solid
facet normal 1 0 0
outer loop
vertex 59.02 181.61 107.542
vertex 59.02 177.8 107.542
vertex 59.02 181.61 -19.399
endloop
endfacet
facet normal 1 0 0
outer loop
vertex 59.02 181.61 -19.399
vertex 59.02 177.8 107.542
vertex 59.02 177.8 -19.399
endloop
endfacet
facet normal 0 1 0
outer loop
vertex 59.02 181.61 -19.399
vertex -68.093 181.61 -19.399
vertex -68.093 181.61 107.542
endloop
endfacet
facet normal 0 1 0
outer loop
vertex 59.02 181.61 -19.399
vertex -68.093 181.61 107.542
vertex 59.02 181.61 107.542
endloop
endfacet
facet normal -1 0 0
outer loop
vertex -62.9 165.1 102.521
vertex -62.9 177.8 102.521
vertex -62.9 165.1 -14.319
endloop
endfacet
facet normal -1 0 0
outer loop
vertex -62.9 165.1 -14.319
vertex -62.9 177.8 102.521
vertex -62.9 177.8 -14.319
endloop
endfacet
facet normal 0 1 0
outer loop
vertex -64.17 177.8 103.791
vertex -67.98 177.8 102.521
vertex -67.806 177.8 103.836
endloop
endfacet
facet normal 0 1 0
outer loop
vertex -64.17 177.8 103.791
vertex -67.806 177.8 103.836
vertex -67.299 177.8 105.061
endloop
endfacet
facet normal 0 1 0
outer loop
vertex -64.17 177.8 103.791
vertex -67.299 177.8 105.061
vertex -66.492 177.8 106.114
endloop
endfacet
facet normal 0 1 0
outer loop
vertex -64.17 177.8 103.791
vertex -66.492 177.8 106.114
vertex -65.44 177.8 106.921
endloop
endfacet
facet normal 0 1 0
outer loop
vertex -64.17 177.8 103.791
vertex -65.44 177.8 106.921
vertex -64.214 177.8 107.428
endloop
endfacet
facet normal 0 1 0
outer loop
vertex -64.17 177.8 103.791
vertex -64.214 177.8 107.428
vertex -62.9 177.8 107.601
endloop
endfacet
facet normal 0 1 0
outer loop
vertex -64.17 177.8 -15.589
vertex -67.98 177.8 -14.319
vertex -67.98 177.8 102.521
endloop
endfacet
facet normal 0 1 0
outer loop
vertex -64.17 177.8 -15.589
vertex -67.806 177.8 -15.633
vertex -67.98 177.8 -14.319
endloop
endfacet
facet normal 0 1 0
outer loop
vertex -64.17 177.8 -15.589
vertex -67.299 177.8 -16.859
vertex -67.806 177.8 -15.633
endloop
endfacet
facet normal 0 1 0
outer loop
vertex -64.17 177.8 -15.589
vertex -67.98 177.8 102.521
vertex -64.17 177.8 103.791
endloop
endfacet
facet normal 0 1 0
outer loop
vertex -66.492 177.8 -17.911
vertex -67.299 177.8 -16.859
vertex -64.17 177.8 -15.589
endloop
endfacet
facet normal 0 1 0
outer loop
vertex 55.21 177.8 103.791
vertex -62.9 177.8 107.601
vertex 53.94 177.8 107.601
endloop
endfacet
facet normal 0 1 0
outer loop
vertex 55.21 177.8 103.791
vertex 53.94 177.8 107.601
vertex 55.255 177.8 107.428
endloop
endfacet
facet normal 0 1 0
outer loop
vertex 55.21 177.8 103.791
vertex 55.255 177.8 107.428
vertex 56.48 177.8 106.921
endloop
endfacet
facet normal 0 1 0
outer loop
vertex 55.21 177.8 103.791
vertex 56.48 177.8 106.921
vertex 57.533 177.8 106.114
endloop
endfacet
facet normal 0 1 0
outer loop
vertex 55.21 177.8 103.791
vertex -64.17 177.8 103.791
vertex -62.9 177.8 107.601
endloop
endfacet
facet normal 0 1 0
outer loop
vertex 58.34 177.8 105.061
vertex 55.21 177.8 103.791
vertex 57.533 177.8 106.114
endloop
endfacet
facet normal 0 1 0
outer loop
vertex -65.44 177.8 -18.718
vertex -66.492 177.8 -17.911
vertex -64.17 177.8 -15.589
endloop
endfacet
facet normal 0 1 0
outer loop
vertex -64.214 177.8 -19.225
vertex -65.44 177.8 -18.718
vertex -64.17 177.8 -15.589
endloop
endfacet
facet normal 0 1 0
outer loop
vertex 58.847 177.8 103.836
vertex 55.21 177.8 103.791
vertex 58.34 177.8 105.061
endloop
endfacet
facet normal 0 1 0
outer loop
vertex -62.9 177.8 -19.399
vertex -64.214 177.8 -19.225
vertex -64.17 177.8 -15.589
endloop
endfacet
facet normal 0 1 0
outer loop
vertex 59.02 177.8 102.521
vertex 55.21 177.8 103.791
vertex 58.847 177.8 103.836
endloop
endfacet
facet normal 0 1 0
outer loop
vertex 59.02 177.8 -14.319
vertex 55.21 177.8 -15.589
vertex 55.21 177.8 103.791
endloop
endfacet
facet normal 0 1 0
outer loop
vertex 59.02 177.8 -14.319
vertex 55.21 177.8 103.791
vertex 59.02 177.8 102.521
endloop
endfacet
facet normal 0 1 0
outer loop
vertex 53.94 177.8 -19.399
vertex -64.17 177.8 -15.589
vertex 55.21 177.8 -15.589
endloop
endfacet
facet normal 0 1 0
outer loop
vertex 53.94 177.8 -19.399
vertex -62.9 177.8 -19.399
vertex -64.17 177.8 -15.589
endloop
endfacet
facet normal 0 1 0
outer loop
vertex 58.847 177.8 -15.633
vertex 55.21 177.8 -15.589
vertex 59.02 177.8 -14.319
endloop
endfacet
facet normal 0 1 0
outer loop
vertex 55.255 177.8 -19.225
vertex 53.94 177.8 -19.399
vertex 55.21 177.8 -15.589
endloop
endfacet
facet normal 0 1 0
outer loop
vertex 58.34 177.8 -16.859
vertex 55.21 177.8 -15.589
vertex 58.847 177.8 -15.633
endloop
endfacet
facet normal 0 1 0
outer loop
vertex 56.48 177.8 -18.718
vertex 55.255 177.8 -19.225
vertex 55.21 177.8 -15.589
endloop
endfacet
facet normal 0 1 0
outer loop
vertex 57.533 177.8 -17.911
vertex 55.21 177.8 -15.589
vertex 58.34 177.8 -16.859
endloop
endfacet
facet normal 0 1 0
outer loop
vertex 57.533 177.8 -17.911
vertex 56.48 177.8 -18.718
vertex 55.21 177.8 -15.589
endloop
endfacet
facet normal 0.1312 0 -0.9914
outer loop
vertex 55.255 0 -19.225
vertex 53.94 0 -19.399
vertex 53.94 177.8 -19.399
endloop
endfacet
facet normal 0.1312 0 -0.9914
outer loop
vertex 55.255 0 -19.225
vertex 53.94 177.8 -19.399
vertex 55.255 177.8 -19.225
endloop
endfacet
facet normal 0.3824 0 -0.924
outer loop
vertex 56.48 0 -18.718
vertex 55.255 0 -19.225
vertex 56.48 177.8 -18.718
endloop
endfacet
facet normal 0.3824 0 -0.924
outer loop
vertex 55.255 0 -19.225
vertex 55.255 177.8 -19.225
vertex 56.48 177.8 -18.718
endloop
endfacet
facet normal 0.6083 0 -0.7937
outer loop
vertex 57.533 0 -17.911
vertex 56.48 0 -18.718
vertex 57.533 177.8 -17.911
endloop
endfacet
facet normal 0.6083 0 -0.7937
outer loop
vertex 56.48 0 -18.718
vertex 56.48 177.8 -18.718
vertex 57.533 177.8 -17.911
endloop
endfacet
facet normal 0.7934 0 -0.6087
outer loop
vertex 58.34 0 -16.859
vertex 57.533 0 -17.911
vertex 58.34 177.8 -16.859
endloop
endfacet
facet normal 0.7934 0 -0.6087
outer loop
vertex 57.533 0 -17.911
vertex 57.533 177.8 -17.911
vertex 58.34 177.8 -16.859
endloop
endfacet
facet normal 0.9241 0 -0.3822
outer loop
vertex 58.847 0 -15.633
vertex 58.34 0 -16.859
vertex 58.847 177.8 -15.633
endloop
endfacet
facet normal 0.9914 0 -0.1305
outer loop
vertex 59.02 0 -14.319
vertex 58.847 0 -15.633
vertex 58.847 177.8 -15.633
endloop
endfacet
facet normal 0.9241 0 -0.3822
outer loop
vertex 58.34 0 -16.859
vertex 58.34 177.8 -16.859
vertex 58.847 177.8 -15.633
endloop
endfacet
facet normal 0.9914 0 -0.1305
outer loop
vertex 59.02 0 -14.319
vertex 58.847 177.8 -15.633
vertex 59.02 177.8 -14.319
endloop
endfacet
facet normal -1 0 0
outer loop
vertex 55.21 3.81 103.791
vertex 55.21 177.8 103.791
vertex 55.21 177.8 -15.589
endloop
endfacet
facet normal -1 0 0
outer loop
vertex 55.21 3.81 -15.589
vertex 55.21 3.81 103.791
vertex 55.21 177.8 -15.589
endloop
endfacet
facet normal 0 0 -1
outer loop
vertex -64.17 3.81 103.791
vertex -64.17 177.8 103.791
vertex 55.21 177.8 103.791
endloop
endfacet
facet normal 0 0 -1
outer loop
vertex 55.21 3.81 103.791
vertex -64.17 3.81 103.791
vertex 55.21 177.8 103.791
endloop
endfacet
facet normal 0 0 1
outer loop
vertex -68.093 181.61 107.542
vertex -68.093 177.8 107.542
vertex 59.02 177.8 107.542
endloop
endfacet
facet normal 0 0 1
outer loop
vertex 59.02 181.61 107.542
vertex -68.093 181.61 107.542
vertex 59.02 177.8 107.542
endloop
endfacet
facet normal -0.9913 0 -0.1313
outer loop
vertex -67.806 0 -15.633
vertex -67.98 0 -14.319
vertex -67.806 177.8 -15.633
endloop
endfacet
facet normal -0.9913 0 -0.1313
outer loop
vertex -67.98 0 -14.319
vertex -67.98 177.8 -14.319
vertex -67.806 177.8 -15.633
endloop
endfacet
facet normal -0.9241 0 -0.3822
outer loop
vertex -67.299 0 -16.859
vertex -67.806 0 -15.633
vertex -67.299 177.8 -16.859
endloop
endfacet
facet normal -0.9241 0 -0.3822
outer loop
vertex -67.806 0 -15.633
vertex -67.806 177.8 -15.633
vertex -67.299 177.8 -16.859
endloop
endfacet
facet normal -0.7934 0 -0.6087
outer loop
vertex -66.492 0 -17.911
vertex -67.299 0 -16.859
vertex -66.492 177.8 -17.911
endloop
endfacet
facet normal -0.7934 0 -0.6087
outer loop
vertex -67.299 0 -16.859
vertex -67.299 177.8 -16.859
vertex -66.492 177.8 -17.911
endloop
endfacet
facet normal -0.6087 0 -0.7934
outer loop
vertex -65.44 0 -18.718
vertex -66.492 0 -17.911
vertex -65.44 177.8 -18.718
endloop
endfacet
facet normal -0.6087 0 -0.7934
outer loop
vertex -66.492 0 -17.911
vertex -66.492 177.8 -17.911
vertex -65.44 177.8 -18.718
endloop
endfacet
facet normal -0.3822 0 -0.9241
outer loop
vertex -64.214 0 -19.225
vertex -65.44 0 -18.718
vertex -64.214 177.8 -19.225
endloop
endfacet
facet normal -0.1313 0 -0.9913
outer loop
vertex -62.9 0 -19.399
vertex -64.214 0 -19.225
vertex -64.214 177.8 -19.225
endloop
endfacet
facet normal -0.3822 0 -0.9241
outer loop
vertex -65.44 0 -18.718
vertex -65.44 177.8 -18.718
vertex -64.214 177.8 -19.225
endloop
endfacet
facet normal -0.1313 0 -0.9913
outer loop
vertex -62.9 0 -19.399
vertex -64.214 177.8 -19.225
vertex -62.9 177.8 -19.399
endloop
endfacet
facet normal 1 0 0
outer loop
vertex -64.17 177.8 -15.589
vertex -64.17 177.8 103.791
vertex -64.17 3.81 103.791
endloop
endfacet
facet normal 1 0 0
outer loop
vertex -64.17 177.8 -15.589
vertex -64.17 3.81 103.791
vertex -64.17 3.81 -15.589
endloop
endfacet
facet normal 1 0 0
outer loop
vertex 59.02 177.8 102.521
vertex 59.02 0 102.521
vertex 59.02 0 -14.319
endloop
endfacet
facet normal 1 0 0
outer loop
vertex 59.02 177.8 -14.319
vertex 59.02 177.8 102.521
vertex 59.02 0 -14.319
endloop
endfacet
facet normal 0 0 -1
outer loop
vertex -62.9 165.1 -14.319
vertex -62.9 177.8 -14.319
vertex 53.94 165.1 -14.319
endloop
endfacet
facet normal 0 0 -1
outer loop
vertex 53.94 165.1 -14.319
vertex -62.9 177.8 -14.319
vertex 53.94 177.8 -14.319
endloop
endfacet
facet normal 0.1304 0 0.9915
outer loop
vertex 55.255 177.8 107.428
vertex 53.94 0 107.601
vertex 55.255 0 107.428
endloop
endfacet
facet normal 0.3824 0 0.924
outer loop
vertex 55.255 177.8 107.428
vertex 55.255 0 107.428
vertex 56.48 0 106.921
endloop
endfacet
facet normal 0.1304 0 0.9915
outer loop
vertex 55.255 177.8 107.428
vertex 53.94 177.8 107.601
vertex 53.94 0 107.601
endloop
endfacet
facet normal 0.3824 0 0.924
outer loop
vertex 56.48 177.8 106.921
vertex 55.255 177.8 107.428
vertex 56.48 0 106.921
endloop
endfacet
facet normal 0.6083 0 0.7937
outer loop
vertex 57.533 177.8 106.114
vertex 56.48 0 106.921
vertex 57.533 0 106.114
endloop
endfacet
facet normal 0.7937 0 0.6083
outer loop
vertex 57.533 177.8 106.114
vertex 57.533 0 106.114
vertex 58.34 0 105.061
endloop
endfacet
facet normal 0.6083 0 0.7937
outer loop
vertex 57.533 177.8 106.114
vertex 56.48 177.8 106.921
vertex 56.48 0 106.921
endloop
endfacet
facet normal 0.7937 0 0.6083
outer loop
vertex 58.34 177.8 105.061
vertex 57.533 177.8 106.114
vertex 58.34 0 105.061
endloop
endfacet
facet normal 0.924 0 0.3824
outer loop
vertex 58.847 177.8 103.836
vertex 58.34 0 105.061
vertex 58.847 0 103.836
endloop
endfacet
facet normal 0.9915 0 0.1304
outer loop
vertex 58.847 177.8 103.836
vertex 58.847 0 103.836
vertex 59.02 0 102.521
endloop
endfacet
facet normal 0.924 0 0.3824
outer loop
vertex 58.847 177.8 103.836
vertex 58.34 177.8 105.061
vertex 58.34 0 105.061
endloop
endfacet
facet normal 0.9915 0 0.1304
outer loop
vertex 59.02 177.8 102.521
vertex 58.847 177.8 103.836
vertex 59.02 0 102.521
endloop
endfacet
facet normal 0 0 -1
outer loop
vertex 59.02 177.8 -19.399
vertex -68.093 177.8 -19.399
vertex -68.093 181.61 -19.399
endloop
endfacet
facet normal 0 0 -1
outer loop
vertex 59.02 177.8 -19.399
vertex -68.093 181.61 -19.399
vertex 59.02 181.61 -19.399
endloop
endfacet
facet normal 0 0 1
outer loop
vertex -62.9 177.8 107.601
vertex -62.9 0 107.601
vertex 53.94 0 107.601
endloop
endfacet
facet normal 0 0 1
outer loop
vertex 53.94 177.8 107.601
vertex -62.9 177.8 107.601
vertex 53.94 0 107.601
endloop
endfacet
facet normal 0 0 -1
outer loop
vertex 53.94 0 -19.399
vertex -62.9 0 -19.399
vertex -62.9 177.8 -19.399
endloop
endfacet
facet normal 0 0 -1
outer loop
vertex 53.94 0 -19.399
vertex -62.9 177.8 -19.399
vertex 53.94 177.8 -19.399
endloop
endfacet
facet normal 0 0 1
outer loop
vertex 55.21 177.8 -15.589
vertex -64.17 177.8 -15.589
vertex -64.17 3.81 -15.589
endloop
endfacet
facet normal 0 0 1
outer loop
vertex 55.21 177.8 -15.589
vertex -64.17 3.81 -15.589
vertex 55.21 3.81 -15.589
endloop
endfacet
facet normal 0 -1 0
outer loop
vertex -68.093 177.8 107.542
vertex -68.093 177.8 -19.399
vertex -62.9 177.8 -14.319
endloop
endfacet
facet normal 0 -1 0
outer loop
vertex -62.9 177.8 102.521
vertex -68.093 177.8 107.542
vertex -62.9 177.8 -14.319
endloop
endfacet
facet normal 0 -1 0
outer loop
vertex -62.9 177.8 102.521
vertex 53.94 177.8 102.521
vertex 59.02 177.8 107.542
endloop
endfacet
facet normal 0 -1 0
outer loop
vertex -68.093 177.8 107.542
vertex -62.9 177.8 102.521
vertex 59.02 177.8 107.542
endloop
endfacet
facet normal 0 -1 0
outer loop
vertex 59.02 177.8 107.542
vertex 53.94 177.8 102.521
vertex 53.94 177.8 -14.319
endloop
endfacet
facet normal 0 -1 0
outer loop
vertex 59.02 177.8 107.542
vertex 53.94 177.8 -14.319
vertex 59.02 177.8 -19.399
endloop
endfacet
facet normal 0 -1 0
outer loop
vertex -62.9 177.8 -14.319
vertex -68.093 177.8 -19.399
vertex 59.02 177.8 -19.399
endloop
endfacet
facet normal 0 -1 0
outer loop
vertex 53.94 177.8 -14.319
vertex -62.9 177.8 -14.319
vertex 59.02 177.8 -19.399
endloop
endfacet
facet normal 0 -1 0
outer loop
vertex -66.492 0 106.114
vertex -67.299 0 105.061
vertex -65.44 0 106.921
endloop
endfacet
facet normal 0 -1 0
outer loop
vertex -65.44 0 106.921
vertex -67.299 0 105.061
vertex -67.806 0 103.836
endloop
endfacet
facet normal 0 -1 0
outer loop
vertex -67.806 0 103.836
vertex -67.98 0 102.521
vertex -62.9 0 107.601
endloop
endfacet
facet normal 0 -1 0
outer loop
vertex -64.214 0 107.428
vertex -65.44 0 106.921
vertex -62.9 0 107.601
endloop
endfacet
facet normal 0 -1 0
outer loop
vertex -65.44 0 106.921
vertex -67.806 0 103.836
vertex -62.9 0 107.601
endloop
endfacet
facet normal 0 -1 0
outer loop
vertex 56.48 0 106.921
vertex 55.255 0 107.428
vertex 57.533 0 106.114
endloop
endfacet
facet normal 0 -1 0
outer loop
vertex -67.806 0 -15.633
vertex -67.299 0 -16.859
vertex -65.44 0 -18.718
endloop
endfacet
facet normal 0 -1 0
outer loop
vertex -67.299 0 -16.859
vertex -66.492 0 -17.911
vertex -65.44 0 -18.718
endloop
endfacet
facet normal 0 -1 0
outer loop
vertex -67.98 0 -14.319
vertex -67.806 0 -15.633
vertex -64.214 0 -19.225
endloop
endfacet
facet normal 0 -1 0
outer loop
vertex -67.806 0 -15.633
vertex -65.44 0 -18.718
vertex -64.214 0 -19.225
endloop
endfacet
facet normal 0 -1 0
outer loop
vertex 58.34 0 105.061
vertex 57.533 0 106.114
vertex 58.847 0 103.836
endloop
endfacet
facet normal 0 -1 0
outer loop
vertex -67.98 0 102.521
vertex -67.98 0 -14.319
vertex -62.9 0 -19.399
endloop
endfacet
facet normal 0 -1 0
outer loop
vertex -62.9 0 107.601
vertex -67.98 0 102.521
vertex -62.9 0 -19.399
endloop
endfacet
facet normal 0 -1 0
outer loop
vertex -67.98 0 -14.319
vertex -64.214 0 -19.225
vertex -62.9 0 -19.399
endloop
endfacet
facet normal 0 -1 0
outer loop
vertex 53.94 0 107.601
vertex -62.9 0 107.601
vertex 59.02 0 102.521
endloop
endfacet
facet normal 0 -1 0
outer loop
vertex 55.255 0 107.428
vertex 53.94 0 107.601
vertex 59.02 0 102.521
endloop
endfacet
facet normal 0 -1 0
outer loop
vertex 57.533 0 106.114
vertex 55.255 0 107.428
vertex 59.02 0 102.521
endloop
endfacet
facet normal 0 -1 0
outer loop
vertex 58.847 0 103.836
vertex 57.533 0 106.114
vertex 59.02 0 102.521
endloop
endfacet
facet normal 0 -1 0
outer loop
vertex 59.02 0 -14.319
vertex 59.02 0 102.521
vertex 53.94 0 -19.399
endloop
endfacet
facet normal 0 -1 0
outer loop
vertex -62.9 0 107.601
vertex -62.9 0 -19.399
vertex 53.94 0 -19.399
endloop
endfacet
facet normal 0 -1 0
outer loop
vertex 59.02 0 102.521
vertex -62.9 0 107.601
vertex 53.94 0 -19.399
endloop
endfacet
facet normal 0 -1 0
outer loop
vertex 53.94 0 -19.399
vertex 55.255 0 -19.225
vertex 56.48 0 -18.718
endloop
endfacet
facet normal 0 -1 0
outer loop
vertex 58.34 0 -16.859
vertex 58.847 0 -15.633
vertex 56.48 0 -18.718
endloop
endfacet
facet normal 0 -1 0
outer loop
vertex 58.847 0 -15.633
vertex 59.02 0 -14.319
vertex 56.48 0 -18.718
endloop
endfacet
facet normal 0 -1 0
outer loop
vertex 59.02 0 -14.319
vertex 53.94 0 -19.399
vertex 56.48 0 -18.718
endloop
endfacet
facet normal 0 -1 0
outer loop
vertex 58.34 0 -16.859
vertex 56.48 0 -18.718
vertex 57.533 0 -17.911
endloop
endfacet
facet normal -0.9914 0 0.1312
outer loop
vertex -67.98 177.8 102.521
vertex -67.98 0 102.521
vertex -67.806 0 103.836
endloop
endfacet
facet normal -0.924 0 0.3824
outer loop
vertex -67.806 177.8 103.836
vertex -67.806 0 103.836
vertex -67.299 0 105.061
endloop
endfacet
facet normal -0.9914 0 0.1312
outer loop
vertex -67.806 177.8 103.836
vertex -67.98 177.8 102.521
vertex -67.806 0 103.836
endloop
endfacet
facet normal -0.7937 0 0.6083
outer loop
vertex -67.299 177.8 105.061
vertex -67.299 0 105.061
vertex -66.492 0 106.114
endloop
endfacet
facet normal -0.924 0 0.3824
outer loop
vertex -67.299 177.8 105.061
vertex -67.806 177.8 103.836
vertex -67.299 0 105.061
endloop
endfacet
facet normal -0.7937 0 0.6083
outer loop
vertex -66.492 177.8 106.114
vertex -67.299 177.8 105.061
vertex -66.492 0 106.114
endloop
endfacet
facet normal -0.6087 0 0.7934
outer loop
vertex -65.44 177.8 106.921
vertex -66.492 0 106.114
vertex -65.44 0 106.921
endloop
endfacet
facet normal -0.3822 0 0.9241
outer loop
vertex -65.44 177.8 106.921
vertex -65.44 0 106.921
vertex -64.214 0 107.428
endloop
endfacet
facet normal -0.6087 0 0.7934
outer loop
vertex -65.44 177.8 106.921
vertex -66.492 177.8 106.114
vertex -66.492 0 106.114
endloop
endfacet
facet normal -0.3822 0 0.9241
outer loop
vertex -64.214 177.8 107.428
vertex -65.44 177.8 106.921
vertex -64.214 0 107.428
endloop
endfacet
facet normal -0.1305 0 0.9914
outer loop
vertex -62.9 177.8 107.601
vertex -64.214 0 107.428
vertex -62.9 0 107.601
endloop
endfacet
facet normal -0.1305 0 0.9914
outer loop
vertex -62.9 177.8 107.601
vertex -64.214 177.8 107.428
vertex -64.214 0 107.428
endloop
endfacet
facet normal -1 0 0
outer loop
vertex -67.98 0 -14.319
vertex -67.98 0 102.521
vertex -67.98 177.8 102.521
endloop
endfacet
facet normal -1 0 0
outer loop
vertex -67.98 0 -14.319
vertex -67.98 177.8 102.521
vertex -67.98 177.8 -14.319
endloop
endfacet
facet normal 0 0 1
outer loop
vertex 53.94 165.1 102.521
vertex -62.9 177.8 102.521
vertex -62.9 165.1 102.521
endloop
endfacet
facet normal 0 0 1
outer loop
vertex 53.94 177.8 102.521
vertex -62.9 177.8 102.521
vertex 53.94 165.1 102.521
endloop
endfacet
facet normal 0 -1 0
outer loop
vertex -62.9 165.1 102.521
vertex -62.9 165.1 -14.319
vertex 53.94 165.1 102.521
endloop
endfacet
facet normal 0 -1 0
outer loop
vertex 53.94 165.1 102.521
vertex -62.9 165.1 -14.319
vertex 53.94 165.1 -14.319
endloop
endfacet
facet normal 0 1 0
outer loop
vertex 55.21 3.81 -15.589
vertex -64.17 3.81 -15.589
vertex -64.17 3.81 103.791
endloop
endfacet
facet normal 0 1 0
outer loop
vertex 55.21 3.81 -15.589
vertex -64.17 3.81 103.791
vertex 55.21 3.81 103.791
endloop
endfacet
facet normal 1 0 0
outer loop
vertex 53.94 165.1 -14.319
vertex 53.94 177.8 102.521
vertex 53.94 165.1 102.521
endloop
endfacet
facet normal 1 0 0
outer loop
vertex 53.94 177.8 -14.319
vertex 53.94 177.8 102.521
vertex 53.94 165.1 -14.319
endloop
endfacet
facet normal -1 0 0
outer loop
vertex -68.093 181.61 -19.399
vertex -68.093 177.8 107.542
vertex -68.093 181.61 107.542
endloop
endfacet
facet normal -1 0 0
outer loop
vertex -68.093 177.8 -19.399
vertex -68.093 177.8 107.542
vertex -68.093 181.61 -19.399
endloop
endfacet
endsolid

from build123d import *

# Parameters (mm, degrees)
SKETCH10_W          = 127
SKETCH10_H          = 127
BOSS_EXTRUDE1_DEPTH = 177.8
SKETCH11_W          = 119.38
SKETCH11_H          = 119.38
CUT_EXTRUDE6_DEPTH  = 173.99
FILLET1_R           = 5.08
SKETCH13_W          = 116.84
SKETCH13_H          = 116.84
BOSS_EXTRUDE2_DEPTH = 12.7
SKETCH15_W          = 127.11314245
SKETCH15_H          = 126.94044737
BOSS_EXTRUDE4_DEPTH = 3.81


with BuildPart() as part:
    # Sketch10 → Boss-Extrude1 (new body)
    with BuildSketch(Plane(origin=(0, 0, 0), x_dir=(1, 0, 0), z_dir=(0, 1, 0))):
        with Locations((-4.479552988, -44.101426274)):
            Rectangle(SKETCH10_W, SKETCH10_H)
    extrude(amount=BOSS_EXTRUDE1_DEPTH)

    # Sketch11 → Cut-Extrude6 (cut)
    with BuildSketch(Plane(origin=(0, 177.8, 0), x_dir=(1, 0, 0), z_dir=(0, 1, 0))):
        with Locations((-4.479552988, -44.101426274)):
            Rectangle(SKETCH11_W, SKETCH11_H)
    extrude(amount=-CUT_EXTRUDE6_DEPTH, mode=Mode.SUBTRACT)

    # Fillet1
    fillet1_edges = [part.edges().sort_by_distance(p)[0] for p in [
        (-67.979552988, 88.9, -19.398573726),
        (59.020447012, 88.9, -19.398573726),
        (59.020447012, 88.9, 107.601426274),
        (-67.979552988, 88.9, 107.601426274),
    ]]
    fillet(fillet1_edges, radius=FILLET1_R)


with BuildPart() as body_2:
    # Sketch13 → Boss-Extrude2 (new body)
    with BuildSketch(Plane(origin=(0, 177.8, 0), x_dir=(1, 0, 0), z_dir=(0, 1, 0))):
        with Locations((-4.479552988, -44.101426274)):
            Rectangle(SKETCH13_W, SKETCH13_H)
    extrude(amount=-BOSS_EXTRUDE2_DEPTH)


with BuildPart() as body_3:
    # Sketch15 → Boss-Extrude4 (new body)
    with BuildSketch(Plane(origin=(0, 177.8, 0), x_dir=(1, 0, 0), z_dir=(0, 1, 0))):
        with Locations((-4.536124213, -44.071649959)):
            Rectangle(SKETCH15_W, SKETCH15_H)
    extrude(amount=BOSS_EXTRUDE4_DEPTH)

    # Combine1: union body 2
    add(body_2.part)


solid = Compound([part.part, body_3.part])
